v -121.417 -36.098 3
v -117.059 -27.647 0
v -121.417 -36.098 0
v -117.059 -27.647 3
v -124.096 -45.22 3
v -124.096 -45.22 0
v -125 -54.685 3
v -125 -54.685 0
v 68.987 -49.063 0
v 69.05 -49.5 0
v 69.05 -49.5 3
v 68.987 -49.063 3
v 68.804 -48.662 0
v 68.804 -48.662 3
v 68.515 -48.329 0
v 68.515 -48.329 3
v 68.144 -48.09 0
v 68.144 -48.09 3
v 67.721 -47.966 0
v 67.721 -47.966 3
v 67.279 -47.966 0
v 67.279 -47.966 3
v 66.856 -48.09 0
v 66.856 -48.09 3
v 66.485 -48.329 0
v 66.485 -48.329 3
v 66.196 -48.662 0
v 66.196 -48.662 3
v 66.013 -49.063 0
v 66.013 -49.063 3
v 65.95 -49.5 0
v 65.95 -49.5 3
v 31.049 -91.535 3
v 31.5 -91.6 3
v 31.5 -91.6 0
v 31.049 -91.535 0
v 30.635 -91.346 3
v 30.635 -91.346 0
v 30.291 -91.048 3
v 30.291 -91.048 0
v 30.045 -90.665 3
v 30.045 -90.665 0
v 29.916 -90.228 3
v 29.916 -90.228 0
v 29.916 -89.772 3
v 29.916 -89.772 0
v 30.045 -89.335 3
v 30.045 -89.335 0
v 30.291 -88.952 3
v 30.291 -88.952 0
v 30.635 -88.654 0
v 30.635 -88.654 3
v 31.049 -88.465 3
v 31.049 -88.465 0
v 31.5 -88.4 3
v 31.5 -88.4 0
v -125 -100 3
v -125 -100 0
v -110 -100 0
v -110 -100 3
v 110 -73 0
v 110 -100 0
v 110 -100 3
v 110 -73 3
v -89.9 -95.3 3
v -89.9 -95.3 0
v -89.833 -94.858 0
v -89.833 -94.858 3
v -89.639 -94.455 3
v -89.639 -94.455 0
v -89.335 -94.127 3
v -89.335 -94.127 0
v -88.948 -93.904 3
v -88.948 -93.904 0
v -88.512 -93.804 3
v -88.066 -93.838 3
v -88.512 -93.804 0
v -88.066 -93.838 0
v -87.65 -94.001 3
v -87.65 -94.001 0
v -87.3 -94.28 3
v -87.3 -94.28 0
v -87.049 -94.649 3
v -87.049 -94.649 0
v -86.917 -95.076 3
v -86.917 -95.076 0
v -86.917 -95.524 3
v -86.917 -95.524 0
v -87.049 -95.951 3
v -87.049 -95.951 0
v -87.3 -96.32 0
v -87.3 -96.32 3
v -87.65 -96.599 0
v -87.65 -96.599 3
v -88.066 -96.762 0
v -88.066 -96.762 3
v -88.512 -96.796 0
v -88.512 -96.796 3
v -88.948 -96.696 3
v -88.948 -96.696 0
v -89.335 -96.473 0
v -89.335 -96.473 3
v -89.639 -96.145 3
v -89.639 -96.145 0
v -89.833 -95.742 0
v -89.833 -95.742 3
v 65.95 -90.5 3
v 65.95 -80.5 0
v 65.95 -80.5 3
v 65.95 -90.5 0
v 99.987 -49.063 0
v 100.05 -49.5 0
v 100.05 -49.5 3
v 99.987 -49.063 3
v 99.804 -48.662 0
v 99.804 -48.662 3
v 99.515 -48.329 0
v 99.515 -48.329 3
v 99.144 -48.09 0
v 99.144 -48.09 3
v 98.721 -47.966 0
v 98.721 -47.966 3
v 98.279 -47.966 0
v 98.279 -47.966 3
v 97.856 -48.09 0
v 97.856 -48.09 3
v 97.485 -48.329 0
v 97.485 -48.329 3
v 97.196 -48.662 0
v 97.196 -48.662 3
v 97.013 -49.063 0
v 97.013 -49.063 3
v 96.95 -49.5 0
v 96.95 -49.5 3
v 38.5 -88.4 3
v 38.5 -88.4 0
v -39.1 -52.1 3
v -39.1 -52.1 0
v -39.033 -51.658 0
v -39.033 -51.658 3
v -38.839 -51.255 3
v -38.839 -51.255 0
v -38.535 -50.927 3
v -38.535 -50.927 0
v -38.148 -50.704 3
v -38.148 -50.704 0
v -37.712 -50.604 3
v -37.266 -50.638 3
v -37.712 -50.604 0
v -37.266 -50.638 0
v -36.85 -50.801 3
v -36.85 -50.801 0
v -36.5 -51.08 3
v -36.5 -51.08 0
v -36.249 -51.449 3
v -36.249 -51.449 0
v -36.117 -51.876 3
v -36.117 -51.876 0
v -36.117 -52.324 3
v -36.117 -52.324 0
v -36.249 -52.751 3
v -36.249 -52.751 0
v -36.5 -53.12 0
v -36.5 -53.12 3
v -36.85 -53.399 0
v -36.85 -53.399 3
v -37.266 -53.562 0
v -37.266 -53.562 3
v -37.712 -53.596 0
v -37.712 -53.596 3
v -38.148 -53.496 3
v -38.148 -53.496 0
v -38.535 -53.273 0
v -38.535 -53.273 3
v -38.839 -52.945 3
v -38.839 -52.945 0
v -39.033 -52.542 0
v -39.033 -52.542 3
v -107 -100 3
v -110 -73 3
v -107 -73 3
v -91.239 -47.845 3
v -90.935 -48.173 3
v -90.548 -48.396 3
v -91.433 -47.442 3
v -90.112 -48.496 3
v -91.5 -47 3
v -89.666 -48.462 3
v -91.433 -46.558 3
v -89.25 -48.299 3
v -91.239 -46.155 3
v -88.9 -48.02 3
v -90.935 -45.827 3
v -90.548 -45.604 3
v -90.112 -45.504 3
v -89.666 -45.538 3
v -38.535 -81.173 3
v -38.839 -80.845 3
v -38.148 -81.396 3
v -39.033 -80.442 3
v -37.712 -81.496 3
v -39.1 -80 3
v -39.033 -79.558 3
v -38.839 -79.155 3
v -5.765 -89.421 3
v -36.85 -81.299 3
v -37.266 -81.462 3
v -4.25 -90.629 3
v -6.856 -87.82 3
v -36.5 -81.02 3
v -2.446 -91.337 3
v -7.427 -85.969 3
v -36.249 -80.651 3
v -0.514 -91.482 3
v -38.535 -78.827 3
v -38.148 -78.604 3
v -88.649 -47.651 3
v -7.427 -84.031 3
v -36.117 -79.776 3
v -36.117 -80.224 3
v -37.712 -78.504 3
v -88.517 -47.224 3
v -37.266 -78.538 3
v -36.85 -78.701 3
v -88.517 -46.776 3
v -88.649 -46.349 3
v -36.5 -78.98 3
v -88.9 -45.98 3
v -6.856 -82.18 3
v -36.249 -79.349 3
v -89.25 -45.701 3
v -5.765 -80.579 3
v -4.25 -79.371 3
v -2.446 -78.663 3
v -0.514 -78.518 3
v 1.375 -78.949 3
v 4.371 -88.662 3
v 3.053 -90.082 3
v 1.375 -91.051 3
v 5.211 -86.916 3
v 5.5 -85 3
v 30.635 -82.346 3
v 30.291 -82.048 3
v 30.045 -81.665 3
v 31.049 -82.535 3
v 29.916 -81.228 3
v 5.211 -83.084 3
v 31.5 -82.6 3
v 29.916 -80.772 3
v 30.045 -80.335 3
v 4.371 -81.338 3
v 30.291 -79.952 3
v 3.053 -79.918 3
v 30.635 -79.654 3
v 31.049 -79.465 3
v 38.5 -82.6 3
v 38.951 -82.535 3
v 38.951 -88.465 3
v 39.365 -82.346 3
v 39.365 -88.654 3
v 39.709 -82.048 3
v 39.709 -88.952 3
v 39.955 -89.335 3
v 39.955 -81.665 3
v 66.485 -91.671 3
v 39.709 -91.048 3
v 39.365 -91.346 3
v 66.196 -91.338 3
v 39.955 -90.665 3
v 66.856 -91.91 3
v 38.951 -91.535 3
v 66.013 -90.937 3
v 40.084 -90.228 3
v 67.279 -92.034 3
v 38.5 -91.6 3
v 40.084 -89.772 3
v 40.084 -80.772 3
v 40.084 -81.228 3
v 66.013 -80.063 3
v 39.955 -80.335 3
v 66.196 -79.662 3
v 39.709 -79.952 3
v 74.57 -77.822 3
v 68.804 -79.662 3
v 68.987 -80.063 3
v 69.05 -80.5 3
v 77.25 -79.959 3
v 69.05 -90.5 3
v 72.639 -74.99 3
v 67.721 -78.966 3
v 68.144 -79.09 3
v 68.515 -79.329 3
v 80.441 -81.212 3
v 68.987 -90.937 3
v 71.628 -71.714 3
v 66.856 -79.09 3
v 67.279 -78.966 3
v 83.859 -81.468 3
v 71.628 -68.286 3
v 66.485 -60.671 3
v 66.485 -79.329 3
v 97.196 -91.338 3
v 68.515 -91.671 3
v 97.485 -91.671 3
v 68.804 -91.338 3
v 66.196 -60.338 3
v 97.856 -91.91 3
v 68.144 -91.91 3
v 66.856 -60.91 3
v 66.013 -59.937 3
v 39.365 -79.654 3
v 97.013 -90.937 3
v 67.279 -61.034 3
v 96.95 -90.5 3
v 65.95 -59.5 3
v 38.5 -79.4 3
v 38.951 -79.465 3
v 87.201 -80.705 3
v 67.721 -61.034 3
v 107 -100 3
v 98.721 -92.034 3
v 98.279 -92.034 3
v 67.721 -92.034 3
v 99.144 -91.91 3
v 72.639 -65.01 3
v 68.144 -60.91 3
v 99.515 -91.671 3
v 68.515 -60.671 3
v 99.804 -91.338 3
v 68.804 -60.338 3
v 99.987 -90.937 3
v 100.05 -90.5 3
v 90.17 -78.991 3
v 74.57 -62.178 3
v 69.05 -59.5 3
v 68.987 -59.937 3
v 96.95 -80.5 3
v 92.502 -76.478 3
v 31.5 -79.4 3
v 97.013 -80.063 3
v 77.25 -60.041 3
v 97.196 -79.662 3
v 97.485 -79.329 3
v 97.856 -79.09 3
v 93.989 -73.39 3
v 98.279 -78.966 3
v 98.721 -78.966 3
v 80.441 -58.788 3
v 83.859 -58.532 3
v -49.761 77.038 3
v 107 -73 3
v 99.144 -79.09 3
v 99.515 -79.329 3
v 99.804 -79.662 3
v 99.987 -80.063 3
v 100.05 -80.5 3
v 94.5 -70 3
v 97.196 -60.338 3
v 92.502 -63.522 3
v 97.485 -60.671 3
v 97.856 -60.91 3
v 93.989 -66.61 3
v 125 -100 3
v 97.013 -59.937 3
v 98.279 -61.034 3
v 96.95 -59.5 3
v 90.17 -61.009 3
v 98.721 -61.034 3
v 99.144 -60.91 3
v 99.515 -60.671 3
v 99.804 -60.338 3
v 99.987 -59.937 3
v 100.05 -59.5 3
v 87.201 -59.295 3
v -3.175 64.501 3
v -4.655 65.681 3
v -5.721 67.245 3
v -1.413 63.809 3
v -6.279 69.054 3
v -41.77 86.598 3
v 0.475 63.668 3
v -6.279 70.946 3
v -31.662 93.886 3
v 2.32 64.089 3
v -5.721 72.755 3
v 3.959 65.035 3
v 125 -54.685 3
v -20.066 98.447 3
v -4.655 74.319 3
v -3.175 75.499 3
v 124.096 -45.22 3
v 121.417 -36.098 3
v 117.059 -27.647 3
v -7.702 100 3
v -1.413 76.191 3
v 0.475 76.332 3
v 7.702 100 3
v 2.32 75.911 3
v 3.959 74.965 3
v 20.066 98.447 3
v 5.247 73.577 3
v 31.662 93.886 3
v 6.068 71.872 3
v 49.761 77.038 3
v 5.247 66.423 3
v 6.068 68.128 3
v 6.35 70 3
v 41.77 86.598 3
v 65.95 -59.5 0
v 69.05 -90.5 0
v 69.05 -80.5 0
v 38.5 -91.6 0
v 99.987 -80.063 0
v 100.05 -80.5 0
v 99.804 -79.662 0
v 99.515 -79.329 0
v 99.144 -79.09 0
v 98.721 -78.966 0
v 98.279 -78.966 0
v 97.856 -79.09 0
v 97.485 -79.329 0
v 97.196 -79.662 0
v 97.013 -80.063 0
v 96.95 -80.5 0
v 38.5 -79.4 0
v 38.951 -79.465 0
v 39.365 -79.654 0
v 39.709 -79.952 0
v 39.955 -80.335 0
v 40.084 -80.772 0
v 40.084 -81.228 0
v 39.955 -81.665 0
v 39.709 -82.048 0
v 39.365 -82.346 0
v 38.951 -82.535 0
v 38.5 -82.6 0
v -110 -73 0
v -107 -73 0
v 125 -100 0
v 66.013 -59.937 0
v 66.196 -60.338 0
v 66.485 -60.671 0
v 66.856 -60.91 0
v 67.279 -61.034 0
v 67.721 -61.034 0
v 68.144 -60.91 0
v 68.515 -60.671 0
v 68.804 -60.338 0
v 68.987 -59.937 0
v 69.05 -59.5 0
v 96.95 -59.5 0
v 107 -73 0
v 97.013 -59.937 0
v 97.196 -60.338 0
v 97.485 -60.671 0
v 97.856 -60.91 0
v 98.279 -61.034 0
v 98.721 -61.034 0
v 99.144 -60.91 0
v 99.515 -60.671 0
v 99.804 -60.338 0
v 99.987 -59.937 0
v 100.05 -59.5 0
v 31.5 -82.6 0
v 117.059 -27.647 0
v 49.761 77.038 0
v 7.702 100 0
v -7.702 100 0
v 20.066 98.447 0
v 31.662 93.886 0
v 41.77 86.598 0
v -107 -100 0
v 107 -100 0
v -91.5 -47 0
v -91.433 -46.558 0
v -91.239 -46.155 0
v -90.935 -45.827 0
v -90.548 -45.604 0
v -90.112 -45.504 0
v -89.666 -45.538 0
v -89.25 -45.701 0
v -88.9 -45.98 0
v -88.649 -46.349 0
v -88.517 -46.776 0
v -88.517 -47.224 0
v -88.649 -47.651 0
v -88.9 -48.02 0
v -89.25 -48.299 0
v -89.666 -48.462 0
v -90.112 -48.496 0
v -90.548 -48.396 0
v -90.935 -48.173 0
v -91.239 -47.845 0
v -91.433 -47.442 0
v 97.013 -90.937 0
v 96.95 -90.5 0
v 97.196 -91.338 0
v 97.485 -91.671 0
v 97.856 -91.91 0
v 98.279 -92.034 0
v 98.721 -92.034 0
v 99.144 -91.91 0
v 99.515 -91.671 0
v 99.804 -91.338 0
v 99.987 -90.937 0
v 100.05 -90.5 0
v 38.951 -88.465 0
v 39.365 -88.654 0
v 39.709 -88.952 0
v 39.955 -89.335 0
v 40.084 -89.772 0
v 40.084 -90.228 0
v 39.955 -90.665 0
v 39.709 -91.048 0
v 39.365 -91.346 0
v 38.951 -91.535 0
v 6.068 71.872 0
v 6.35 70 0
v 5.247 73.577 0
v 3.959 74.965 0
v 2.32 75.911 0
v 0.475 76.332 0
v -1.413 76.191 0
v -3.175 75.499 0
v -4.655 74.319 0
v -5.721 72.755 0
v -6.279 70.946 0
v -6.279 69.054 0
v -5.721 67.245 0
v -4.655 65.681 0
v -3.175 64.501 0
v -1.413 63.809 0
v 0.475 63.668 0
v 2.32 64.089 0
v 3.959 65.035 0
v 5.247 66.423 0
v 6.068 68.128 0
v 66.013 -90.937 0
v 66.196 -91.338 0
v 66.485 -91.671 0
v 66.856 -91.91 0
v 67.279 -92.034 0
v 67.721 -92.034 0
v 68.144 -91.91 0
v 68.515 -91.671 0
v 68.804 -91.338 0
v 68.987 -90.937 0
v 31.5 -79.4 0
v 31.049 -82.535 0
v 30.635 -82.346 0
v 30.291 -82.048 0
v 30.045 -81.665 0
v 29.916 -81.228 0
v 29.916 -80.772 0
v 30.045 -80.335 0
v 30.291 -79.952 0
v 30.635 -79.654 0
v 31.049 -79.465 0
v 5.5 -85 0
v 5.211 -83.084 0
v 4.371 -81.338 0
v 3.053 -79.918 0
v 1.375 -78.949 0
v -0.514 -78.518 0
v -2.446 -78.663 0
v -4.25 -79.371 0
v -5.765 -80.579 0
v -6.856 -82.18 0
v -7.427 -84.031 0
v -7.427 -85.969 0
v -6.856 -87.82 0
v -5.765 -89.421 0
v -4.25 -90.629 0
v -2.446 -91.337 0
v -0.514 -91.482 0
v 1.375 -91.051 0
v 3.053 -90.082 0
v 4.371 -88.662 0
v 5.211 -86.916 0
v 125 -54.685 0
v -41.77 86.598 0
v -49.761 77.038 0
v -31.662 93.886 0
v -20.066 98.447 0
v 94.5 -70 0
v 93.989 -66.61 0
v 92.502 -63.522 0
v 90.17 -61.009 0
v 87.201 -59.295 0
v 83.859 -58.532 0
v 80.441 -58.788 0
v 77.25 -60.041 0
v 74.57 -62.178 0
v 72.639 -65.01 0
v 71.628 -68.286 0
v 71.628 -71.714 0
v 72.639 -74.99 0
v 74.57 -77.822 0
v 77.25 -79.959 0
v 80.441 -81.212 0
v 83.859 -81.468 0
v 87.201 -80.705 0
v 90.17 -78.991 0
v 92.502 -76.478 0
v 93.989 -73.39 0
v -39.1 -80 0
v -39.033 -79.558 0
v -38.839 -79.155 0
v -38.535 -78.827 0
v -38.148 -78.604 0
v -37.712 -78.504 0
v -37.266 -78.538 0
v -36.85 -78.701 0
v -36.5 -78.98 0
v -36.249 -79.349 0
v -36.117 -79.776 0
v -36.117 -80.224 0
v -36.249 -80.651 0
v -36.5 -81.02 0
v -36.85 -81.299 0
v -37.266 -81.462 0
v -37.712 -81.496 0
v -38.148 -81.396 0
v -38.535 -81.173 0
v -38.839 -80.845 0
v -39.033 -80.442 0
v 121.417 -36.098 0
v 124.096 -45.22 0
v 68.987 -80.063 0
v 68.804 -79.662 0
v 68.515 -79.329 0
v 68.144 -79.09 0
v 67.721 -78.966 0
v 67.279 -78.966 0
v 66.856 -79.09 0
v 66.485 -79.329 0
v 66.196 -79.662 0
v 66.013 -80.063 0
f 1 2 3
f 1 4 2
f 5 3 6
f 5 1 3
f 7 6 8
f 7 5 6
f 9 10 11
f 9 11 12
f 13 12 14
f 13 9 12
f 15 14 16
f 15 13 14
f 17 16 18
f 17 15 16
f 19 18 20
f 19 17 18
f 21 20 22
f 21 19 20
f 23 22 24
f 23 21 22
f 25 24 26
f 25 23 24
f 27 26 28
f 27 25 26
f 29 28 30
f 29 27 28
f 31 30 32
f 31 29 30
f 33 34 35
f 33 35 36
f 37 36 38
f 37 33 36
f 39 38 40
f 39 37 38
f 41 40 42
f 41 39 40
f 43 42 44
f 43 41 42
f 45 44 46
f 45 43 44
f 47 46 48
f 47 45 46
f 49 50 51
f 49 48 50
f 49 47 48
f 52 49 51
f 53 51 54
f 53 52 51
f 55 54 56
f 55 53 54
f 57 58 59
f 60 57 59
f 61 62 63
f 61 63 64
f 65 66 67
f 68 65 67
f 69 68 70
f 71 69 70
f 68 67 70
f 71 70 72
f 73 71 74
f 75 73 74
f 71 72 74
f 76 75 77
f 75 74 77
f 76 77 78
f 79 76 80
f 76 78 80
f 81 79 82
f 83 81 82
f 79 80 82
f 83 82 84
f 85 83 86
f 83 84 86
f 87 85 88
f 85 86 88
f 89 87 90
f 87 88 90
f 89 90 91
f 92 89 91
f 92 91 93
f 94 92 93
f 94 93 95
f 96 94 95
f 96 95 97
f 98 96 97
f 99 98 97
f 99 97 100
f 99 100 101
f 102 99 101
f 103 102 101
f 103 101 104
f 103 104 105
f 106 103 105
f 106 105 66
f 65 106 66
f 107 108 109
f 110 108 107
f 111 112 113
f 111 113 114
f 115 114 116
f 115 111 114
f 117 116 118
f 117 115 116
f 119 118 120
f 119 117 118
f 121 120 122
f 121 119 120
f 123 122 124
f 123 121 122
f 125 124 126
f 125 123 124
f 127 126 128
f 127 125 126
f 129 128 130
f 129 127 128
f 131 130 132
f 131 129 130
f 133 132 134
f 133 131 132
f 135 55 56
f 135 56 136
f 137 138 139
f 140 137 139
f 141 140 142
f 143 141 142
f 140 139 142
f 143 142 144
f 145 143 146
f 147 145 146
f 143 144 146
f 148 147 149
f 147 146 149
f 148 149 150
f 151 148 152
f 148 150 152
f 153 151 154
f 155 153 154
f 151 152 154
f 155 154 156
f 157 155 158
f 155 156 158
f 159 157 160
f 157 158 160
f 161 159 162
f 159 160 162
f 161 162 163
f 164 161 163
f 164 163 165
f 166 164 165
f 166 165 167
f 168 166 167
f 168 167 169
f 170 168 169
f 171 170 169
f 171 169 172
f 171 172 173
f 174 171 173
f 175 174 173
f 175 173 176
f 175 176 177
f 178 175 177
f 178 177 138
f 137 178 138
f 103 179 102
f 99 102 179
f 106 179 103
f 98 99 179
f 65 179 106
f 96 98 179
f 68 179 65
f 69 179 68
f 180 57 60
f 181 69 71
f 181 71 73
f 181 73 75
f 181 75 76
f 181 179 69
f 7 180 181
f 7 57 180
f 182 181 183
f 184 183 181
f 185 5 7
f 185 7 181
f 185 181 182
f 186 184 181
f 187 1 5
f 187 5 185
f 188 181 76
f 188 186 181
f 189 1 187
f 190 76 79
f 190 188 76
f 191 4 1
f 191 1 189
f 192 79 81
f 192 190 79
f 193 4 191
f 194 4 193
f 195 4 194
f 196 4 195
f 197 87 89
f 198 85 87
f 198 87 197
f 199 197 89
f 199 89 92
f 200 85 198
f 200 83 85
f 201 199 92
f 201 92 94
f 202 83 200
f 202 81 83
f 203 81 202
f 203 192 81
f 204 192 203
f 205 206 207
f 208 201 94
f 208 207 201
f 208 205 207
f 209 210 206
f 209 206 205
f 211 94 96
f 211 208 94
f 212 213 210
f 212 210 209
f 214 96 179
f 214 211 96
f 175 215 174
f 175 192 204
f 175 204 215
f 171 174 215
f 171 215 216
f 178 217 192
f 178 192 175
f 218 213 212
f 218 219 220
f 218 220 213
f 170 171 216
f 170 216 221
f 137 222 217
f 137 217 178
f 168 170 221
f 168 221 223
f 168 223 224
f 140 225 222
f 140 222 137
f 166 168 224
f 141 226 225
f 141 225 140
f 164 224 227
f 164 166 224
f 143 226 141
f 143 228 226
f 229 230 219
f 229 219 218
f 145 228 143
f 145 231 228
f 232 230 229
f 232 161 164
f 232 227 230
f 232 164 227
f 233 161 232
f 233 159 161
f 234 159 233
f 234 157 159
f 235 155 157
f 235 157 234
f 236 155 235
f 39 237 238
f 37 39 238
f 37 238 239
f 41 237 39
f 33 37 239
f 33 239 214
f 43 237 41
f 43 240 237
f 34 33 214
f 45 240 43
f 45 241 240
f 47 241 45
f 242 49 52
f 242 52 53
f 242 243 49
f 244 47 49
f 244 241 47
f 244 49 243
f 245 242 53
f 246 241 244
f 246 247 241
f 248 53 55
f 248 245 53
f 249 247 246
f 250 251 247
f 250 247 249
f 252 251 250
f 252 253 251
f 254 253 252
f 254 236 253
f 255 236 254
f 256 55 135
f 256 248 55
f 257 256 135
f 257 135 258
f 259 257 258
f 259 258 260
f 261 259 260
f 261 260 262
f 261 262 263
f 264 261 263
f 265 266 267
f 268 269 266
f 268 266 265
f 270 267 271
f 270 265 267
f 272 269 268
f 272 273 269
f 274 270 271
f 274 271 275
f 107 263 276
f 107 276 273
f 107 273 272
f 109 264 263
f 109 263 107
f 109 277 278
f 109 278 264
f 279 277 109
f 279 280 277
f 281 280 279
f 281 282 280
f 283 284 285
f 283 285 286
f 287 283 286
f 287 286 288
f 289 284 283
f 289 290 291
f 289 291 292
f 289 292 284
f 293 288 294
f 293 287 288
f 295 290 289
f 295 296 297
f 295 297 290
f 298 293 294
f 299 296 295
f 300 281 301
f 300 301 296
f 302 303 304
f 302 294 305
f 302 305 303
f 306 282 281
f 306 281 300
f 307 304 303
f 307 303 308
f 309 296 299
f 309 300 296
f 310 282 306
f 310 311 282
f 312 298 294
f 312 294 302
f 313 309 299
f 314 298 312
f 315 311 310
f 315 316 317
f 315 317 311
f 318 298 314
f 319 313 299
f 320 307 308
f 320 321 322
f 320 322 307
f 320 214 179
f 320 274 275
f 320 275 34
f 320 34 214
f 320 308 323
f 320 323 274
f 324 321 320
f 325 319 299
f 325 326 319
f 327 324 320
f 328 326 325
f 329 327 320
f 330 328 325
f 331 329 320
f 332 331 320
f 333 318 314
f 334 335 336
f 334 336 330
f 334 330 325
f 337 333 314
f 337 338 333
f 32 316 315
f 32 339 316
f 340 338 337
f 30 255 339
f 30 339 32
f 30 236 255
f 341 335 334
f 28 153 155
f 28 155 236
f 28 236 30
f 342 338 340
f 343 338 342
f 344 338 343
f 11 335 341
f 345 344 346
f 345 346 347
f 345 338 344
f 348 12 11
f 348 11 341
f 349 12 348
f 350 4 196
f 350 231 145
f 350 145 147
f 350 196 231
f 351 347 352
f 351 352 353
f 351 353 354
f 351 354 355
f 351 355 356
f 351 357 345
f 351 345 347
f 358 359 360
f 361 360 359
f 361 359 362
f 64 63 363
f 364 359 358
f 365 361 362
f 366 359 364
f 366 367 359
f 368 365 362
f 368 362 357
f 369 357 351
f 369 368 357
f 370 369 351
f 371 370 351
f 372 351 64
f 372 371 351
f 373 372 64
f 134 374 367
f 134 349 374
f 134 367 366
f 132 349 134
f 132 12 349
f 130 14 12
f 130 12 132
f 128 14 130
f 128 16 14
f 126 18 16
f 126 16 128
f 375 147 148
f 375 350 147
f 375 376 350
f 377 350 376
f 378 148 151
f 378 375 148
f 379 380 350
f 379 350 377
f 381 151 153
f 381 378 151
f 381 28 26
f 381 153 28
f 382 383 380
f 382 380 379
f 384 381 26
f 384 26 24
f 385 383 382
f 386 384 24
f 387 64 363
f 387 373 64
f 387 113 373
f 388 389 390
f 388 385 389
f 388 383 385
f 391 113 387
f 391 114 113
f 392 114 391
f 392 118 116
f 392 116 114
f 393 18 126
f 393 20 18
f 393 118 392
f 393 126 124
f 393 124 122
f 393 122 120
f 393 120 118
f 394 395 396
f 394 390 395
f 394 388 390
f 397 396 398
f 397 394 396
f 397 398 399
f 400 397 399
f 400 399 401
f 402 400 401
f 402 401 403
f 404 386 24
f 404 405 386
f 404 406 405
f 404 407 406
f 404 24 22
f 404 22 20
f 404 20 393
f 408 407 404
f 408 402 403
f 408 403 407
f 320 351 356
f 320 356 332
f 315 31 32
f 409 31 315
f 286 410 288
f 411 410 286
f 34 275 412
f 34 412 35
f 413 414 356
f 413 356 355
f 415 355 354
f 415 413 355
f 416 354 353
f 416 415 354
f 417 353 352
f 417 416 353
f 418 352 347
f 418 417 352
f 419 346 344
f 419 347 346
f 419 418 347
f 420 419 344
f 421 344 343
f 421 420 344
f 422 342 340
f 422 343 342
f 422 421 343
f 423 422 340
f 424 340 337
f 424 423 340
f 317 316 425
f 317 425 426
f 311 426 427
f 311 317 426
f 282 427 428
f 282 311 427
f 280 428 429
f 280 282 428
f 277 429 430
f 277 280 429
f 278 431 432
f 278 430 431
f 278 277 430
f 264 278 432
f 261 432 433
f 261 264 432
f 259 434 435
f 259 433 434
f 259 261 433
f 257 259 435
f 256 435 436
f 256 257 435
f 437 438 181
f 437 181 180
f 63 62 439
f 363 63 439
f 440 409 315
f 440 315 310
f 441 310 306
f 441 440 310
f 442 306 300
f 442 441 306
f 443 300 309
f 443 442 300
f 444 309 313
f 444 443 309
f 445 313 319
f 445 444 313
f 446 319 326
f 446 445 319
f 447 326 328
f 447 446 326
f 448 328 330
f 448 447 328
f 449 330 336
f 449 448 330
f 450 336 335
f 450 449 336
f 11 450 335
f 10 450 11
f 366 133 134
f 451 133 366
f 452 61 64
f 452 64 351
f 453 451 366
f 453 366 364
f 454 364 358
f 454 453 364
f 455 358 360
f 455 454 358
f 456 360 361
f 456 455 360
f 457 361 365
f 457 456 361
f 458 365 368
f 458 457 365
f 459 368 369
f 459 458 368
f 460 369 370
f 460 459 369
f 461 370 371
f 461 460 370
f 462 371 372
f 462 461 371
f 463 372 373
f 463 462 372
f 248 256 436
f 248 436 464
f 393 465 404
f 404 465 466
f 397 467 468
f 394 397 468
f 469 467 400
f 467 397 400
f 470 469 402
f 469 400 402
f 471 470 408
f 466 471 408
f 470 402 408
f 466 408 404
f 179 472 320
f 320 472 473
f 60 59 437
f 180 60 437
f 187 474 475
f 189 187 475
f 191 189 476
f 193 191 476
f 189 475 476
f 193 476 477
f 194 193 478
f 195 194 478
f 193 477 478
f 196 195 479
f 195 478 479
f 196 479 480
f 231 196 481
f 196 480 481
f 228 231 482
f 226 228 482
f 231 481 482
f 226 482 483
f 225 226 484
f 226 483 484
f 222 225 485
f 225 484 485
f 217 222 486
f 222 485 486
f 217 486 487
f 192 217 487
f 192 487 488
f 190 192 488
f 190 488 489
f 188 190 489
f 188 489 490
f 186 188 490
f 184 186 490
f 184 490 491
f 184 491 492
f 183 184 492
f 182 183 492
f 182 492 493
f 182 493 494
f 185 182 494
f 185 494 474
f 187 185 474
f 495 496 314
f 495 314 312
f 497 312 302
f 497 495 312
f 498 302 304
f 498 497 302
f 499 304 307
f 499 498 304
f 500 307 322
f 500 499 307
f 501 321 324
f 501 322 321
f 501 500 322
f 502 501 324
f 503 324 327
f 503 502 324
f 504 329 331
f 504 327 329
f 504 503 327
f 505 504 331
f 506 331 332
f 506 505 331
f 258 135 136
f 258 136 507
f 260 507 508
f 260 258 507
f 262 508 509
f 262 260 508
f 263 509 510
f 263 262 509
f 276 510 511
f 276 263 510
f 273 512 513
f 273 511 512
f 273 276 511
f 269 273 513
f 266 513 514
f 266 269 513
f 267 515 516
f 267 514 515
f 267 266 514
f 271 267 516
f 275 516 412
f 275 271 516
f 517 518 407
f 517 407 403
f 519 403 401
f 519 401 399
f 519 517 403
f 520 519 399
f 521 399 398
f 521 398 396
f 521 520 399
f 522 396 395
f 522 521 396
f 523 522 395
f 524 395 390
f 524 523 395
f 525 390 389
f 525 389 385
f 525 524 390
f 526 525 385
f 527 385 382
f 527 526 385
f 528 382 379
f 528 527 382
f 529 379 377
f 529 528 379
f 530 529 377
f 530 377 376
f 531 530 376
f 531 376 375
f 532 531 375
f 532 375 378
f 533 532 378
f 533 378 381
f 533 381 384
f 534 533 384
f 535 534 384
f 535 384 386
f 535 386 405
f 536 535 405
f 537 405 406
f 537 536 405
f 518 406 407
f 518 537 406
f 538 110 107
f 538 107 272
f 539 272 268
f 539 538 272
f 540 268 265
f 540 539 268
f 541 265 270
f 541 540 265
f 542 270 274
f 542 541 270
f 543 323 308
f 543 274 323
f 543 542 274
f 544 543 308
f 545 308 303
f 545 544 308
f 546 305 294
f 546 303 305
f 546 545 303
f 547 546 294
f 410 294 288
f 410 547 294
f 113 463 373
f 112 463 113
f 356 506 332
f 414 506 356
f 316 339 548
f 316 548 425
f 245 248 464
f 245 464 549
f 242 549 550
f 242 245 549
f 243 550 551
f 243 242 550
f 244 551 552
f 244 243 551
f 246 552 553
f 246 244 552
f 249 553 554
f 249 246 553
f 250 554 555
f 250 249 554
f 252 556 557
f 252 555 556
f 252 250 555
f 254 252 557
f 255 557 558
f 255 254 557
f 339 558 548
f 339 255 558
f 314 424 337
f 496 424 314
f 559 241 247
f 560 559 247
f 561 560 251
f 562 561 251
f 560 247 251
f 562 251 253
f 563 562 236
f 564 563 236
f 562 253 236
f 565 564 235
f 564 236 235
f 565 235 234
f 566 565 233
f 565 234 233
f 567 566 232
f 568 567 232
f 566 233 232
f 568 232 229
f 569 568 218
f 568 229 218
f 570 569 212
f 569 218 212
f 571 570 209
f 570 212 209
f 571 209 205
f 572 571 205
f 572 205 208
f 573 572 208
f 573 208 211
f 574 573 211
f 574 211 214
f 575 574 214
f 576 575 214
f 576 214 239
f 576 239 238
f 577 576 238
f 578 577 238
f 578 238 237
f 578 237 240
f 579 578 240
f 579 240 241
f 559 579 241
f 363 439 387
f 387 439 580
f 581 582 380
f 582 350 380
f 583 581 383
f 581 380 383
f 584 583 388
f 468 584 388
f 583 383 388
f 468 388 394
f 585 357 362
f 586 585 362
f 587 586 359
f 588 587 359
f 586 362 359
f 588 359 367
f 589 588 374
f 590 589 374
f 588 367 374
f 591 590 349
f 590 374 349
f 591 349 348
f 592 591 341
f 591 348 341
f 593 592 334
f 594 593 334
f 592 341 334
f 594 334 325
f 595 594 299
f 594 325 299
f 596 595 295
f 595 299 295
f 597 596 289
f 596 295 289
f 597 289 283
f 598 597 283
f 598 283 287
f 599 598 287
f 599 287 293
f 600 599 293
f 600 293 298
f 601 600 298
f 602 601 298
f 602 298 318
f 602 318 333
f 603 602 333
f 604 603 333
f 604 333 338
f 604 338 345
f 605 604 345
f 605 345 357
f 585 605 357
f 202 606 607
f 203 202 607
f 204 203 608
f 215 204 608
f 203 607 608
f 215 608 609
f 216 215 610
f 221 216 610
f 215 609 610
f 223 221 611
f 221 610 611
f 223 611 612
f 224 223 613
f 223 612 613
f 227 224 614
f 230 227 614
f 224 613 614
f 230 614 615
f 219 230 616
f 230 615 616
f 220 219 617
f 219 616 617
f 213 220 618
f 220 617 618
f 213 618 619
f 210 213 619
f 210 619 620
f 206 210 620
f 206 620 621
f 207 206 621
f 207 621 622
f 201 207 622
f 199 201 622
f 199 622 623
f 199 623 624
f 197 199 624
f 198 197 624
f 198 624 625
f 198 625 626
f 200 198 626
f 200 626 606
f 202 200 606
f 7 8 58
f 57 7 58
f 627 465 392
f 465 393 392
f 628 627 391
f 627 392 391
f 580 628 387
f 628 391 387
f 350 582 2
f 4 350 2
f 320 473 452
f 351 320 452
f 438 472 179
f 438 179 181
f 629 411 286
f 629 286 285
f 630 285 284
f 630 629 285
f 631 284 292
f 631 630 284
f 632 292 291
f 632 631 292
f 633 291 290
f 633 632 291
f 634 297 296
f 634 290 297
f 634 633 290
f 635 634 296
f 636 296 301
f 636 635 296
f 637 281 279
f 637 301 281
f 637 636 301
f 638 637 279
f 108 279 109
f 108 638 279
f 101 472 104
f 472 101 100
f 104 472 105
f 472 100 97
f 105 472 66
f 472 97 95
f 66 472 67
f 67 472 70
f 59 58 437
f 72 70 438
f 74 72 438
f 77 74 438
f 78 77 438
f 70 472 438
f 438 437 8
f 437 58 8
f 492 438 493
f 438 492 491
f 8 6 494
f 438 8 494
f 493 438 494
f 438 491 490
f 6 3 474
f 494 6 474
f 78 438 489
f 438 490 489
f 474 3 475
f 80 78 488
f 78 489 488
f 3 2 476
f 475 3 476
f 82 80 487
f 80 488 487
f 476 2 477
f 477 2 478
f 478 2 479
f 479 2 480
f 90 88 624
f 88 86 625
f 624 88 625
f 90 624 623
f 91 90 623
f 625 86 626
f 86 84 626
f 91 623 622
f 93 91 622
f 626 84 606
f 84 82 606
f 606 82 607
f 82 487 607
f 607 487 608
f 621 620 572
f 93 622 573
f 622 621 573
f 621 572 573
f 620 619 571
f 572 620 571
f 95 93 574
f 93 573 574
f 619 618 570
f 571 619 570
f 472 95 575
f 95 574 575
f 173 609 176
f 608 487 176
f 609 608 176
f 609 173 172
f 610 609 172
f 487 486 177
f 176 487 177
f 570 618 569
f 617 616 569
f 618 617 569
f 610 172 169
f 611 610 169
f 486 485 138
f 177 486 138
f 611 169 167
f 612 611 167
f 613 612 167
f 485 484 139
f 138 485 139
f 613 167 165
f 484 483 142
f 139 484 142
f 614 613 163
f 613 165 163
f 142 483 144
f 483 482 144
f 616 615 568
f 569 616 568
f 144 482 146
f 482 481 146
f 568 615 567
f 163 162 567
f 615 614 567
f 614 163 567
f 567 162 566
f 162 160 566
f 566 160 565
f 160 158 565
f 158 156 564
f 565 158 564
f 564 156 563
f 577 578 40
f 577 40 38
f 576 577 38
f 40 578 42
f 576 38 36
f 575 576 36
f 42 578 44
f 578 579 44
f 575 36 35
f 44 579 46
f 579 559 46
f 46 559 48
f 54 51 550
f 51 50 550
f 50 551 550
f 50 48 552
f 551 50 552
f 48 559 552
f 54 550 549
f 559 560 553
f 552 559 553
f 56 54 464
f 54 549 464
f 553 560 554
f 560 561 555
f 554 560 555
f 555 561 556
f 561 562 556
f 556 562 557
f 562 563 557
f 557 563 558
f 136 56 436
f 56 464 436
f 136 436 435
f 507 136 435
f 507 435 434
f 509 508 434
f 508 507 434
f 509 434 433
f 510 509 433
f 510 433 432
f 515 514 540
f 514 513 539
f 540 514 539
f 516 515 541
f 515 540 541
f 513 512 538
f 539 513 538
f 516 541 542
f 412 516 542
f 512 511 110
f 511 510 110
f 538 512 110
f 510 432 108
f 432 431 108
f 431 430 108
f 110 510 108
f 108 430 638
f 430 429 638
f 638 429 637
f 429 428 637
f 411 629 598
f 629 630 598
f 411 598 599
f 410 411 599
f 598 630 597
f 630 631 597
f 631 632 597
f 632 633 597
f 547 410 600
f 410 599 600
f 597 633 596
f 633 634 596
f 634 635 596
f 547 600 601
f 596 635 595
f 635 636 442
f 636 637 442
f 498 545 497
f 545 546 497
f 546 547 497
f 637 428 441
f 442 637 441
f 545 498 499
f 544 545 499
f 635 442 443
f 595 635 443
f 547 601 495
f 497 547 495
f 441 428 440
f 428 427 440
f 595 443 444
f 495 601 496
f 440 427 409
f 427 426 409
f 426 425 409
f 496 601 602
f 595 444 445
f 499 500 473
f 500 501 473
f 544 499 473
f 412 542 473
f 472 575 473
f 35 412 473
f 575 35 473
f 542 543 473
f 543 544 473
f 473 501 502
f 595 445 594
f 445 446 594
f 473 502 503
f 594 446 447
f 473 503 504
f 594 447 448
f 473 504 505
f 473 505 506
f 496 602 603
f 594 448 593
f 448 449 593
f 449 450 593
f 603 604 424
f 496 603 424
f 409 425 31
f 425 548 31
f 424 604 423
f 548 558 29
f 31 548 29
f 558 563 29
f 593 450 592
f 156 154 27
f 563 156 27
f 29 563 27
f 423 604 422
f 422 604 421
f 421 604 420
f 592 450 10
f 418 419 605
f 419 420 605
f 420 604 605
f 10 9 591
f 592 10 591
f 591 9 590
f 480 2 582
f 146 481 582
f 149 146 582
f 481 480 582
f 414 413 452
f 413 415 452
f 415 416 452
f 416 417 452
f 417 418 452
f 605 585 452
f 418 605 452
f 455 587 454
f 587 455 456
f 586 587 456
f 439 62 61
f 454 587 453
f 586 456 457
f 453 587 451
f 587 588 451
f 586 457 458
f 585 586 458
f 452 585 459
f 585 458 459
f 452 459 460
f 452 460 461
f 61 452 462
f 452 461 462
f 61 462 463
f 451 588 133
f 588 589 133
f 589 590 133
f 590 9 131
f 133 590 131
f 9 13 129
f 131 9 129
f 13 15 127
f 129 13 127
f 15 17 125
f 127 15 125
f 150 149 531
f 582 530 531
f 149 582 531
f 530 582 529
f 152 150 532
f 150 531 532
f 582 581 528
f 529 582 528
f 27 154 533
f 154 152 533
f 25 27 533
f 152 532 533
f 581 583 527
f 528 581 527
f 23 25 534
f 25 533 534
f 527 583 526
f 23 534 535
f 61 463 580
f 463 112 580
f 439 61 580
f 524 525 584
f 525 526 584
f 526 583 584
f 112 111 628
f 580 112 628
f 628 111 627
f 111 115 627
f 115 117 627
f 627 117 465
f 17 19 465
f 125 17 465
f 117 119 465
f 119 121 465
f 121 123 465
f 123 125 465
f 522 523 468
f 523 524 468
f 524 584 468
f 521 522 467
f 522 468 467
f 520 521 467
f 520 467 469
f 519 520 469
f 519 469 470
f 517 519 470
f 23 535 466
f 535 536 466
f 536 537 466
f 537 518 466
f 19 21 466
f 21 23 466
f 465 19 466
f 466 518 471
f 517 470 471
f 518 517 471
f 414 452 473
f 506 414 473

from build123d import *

# Parameters (mm, degrees)
CROQUIS1_R              = 6.35
SALIENTE_EXTRUIR1_DEPTH = 3
REDONDEO1_R             = 50
CROQUIS2_R              = 11.5
CORTAR_EXTRUIR1_DEPTH   = 10
CROQUIS6_W              = 3
CROQUIS6_H              = 27
CORTAR_EXTRUIR3_DEPTH   = 4
CROQUIS7_R              = 1.5
CORTAR_EXTRUIR4_DEPTH   = 4
CROQUIS8_R              = 6.5
CORTAR_EXTRUIR5_DEPTH   = 4
CORTAR_EXTRUIR6_DEPTH   = 4


with BuildPart() as part:
    # Croquis1 → Saliente-Extruir1 (new body)
    with BuildSketch(Plane.XY):
        Polygon((-35, 100), (-125, -40), (-125, -100), (125, -100), (125, -40), (35, 100), align=None)
        with Locations((0, 70)):
            Circle(CROQUIS1_R, mode=Mode.SUBTRACT)
    extrude(amount=SALIENTE_EXTRUIR1_DEPTH)

    # Redondeo1
    redondeo1_edges = [part.edges().sort_by_distance(p)[0] for p in [
        (125, -40, 1.5),
        (-125, -40, 1.5),
        (-35, 100, 1.5),
        (35, 100, 1.5),
    ]]
    fillet(redondeo1_edges, radius=REDONDEO1_R)

    # Croquis2 → Cortar-Extruir1 (cut)
    with BuildSketch(Plane.XY.offset(3)):
        with BuildLine():
            ThreePointArc((100, -54.5), (98.5, -53), (97, -54.5))
            Line((97, -54.5), (98.5, -54.5))
            Line((98.5, -54.5), (98.5, -56))
            ThreePointArc((98.5, -56), (99.560660172, -55.560660172), (100, -54.5))
        make_face()
        with BuildLine():
            Line((98.5, -54.5), (97, -54.5))
            ThreePointArc((97, -54.5), (97.439339828, -55.560660172), (98.5, -56))
            Line((98.5, -56), (98.5, -54.5))
        make_face()
        with BuildLine():
            Line((67.5, -56), (67.5, -54.5))
            Line((67.5, -54.5), (69, -54.5))
            ThreePointArc((69, -54.5), (66.439339828, -53.439339828), (67.5, -56))
        make_face()
        with BuildLine():
            Line((69, -54.5), (67.5, -54.5))
            Line((67.5, -54.5), (67.5, -56))
            ThreePointArc((67.5, -56), (68.560660172, -55.560660172), (69, -54.5))
        make_face()
        with Locations((83, -70)):
            Circle(CROQUIS2_R)
        with BuildLine():
            ThreePointArc((69, -85.5), (68.560660172, -84.439339828), (67.5, -84))
            Line((67.5, -84), (67.5, -85.5))
            Line((67.5, -85.5), (69, -85.5))
        make_face()
        with BuildLine():
            Line((67.5, -85.5), (67.5, -84))
            ThreePointArc((67.5, -84), (66.439339828, -86.560660172), (69, -85.5))
            Line((69, -85.5), (67.5, -85.5))
        make_face()
        with BuildLine():
            ThreePointArc((100, -85.5), (99.560660172, -84.439339828), (98.5, -84))
            Line((98.5, -84), (98.5, -85.5))
            Line((98.5, -85.5), (97, -85.5))
            ThreePointArc((97, -85.5), (98.5, -87), (100, -85.5))
        make_face()
        with BuildLine():
            Line((98.5, -85.5), (98.5, -84))
            ThreePointArc((98.5, -84), (97.439339828, -84.439339828), (97, -85.5))
            Line((97, -85.5), (98.5, -85.5))
        make_face()
    extrude(amount=-CORTAR_EXTRUIR1_DEPTH, mode=Mode.SUBTRACT)

    # Croquis6 → Cortar-Extruir3 (cut, through all)
    with BuildSketch(Plane(origin=(0, 0, 0), x_dir=(-1, 0, 0), z_dir=(0, 0, -1))):
        with Locations((-108.5, -86.5)):
            Rectangle(CROQUIS6_W, CROQUIS6_H)
        with Locations((108.5, -86.5)):
            Rectangle(CROQUIS6_W, CROQUIS6_H)
    extrude(amount=-CORTAR_EXTRUIR3_DEPTH, mode=Mode.SUBTRACT)

    # Croquis7 → Cortar-Extruir4 (cut, through all)
    with BuildSketch(Plane(origin=(0, 0, 0), x_dir=(-1, 0, 0), z_dir=(0, 0, -1))):
        with Locations((90, -47)):
            Circle(CROQUIS7_R)
        with Locations((37.6, -52.1)):
            Circle(CROQUIS7_R)
        with Locations((37.6, -80)):
            Circle(CROQUIS7_R)
        with Locations((88.4, -95.3)):
            Circle(CROQUIS7_R)
    extrude(amount=-CORTAR_EXTRUIR4_DEPTH, mode=Mode.SUBTRACT)

    # Croquis8 → Cortar-Extruir5 (cut, through all)
    with BuildSketch(Plane.XY.offset(3)):
        with Locations((-1, -85)):
            Circle(CROQUIS8_R)
        with BuildLine():
            Line((31.5, -88.4), (38.5, -88.4))
            ThreePointArc((38.5, -88.4), (40.1, -90), (38.5, -91.6))
            Line((38.5, -91.6), (31.5, -91.6))
            ThreePointArc((31.5, -91.6), (29.9, -90), (31.5, -88.4))
        make_face()
        with BuildLine():
            Line((31.5, -79.4), (38.5, -79.4))
            ThreePointArc((38.5, -79.4), (40.1, -81), (38.5, -82.6))
            Line((38.5, -82.6), (31.5, -82.6))
            ThreePointArc((31.5, -82.6), (29.9, -81), (31.5, -79.4))
        make_face()
    extrude(amount=-CORTAR_EXTRUIR5_DEPTH, mode=Mode.SUBTRACT)

    # Croquis9 → Cortar-Extruir6 (cut, through all)
    with BuildSketch(Plane(origin=(0, 0, 0), x_dir=(-1, 0, 0), z_dir=(0, 0, -1))):
        with BuildLine():
            Line((-96.95, -49.5), (-96.95, -59.5))
            ThreePointArc((-96.95, -59.5), (-98.5, -61.05), (-100.05, -59.5))
            Line((-100.05, -59.5), (-100.05, -49.5))
            ThreePointArc((-100.05, -49.5), (-98.5, -47.95), (-96.95, -49.5))
        make_face()
        with BuildLine():
            Line((-65.95, -49.5), (-65.95, -59.5))
            ThreePointArc((-65.95, -59.5), (-67.5, -61.05), (-69.05, -59.5))
            Line((-69.05, -59.5), (-69.05, -49.5))
            ThreePointArc((-69.05, -49.5), (-67.5, -47.95), (-65.95, -49.5))
        make_face()
        with BuildLine():
            Line((-69.05, -90.5), (-69.05, -80.5))
            ThreePointArc((-69.05, -80.5), (-67.5, -78.95), (-65.95, -80.5))
            Line((-65.95, -80.5), (-65.95, -90.5))
            ThreePointArc((-65.95, -90.5), (-67.5, -92.05), (-69.05, -90.5))
        make_face()
        with BuildLine():
            Line((-100.05, -90.5), (-100.05, -80.5))
            ThreePointArc((-100.05, -80.5), (-98.5, -78.95), (-96.95, -80.5))
            Line((-96.95, -80.5), (-96.95, -90.5))
            ThreePointArc((-96.95, -90.5), (-98.5, -92.05), (-100.05, -90.5))
        make_face()
    extrude(amount=-CORTAR_EXTRUIR6_DEPTH, mode=Mode.SUBTRACT)


solid = part.part
